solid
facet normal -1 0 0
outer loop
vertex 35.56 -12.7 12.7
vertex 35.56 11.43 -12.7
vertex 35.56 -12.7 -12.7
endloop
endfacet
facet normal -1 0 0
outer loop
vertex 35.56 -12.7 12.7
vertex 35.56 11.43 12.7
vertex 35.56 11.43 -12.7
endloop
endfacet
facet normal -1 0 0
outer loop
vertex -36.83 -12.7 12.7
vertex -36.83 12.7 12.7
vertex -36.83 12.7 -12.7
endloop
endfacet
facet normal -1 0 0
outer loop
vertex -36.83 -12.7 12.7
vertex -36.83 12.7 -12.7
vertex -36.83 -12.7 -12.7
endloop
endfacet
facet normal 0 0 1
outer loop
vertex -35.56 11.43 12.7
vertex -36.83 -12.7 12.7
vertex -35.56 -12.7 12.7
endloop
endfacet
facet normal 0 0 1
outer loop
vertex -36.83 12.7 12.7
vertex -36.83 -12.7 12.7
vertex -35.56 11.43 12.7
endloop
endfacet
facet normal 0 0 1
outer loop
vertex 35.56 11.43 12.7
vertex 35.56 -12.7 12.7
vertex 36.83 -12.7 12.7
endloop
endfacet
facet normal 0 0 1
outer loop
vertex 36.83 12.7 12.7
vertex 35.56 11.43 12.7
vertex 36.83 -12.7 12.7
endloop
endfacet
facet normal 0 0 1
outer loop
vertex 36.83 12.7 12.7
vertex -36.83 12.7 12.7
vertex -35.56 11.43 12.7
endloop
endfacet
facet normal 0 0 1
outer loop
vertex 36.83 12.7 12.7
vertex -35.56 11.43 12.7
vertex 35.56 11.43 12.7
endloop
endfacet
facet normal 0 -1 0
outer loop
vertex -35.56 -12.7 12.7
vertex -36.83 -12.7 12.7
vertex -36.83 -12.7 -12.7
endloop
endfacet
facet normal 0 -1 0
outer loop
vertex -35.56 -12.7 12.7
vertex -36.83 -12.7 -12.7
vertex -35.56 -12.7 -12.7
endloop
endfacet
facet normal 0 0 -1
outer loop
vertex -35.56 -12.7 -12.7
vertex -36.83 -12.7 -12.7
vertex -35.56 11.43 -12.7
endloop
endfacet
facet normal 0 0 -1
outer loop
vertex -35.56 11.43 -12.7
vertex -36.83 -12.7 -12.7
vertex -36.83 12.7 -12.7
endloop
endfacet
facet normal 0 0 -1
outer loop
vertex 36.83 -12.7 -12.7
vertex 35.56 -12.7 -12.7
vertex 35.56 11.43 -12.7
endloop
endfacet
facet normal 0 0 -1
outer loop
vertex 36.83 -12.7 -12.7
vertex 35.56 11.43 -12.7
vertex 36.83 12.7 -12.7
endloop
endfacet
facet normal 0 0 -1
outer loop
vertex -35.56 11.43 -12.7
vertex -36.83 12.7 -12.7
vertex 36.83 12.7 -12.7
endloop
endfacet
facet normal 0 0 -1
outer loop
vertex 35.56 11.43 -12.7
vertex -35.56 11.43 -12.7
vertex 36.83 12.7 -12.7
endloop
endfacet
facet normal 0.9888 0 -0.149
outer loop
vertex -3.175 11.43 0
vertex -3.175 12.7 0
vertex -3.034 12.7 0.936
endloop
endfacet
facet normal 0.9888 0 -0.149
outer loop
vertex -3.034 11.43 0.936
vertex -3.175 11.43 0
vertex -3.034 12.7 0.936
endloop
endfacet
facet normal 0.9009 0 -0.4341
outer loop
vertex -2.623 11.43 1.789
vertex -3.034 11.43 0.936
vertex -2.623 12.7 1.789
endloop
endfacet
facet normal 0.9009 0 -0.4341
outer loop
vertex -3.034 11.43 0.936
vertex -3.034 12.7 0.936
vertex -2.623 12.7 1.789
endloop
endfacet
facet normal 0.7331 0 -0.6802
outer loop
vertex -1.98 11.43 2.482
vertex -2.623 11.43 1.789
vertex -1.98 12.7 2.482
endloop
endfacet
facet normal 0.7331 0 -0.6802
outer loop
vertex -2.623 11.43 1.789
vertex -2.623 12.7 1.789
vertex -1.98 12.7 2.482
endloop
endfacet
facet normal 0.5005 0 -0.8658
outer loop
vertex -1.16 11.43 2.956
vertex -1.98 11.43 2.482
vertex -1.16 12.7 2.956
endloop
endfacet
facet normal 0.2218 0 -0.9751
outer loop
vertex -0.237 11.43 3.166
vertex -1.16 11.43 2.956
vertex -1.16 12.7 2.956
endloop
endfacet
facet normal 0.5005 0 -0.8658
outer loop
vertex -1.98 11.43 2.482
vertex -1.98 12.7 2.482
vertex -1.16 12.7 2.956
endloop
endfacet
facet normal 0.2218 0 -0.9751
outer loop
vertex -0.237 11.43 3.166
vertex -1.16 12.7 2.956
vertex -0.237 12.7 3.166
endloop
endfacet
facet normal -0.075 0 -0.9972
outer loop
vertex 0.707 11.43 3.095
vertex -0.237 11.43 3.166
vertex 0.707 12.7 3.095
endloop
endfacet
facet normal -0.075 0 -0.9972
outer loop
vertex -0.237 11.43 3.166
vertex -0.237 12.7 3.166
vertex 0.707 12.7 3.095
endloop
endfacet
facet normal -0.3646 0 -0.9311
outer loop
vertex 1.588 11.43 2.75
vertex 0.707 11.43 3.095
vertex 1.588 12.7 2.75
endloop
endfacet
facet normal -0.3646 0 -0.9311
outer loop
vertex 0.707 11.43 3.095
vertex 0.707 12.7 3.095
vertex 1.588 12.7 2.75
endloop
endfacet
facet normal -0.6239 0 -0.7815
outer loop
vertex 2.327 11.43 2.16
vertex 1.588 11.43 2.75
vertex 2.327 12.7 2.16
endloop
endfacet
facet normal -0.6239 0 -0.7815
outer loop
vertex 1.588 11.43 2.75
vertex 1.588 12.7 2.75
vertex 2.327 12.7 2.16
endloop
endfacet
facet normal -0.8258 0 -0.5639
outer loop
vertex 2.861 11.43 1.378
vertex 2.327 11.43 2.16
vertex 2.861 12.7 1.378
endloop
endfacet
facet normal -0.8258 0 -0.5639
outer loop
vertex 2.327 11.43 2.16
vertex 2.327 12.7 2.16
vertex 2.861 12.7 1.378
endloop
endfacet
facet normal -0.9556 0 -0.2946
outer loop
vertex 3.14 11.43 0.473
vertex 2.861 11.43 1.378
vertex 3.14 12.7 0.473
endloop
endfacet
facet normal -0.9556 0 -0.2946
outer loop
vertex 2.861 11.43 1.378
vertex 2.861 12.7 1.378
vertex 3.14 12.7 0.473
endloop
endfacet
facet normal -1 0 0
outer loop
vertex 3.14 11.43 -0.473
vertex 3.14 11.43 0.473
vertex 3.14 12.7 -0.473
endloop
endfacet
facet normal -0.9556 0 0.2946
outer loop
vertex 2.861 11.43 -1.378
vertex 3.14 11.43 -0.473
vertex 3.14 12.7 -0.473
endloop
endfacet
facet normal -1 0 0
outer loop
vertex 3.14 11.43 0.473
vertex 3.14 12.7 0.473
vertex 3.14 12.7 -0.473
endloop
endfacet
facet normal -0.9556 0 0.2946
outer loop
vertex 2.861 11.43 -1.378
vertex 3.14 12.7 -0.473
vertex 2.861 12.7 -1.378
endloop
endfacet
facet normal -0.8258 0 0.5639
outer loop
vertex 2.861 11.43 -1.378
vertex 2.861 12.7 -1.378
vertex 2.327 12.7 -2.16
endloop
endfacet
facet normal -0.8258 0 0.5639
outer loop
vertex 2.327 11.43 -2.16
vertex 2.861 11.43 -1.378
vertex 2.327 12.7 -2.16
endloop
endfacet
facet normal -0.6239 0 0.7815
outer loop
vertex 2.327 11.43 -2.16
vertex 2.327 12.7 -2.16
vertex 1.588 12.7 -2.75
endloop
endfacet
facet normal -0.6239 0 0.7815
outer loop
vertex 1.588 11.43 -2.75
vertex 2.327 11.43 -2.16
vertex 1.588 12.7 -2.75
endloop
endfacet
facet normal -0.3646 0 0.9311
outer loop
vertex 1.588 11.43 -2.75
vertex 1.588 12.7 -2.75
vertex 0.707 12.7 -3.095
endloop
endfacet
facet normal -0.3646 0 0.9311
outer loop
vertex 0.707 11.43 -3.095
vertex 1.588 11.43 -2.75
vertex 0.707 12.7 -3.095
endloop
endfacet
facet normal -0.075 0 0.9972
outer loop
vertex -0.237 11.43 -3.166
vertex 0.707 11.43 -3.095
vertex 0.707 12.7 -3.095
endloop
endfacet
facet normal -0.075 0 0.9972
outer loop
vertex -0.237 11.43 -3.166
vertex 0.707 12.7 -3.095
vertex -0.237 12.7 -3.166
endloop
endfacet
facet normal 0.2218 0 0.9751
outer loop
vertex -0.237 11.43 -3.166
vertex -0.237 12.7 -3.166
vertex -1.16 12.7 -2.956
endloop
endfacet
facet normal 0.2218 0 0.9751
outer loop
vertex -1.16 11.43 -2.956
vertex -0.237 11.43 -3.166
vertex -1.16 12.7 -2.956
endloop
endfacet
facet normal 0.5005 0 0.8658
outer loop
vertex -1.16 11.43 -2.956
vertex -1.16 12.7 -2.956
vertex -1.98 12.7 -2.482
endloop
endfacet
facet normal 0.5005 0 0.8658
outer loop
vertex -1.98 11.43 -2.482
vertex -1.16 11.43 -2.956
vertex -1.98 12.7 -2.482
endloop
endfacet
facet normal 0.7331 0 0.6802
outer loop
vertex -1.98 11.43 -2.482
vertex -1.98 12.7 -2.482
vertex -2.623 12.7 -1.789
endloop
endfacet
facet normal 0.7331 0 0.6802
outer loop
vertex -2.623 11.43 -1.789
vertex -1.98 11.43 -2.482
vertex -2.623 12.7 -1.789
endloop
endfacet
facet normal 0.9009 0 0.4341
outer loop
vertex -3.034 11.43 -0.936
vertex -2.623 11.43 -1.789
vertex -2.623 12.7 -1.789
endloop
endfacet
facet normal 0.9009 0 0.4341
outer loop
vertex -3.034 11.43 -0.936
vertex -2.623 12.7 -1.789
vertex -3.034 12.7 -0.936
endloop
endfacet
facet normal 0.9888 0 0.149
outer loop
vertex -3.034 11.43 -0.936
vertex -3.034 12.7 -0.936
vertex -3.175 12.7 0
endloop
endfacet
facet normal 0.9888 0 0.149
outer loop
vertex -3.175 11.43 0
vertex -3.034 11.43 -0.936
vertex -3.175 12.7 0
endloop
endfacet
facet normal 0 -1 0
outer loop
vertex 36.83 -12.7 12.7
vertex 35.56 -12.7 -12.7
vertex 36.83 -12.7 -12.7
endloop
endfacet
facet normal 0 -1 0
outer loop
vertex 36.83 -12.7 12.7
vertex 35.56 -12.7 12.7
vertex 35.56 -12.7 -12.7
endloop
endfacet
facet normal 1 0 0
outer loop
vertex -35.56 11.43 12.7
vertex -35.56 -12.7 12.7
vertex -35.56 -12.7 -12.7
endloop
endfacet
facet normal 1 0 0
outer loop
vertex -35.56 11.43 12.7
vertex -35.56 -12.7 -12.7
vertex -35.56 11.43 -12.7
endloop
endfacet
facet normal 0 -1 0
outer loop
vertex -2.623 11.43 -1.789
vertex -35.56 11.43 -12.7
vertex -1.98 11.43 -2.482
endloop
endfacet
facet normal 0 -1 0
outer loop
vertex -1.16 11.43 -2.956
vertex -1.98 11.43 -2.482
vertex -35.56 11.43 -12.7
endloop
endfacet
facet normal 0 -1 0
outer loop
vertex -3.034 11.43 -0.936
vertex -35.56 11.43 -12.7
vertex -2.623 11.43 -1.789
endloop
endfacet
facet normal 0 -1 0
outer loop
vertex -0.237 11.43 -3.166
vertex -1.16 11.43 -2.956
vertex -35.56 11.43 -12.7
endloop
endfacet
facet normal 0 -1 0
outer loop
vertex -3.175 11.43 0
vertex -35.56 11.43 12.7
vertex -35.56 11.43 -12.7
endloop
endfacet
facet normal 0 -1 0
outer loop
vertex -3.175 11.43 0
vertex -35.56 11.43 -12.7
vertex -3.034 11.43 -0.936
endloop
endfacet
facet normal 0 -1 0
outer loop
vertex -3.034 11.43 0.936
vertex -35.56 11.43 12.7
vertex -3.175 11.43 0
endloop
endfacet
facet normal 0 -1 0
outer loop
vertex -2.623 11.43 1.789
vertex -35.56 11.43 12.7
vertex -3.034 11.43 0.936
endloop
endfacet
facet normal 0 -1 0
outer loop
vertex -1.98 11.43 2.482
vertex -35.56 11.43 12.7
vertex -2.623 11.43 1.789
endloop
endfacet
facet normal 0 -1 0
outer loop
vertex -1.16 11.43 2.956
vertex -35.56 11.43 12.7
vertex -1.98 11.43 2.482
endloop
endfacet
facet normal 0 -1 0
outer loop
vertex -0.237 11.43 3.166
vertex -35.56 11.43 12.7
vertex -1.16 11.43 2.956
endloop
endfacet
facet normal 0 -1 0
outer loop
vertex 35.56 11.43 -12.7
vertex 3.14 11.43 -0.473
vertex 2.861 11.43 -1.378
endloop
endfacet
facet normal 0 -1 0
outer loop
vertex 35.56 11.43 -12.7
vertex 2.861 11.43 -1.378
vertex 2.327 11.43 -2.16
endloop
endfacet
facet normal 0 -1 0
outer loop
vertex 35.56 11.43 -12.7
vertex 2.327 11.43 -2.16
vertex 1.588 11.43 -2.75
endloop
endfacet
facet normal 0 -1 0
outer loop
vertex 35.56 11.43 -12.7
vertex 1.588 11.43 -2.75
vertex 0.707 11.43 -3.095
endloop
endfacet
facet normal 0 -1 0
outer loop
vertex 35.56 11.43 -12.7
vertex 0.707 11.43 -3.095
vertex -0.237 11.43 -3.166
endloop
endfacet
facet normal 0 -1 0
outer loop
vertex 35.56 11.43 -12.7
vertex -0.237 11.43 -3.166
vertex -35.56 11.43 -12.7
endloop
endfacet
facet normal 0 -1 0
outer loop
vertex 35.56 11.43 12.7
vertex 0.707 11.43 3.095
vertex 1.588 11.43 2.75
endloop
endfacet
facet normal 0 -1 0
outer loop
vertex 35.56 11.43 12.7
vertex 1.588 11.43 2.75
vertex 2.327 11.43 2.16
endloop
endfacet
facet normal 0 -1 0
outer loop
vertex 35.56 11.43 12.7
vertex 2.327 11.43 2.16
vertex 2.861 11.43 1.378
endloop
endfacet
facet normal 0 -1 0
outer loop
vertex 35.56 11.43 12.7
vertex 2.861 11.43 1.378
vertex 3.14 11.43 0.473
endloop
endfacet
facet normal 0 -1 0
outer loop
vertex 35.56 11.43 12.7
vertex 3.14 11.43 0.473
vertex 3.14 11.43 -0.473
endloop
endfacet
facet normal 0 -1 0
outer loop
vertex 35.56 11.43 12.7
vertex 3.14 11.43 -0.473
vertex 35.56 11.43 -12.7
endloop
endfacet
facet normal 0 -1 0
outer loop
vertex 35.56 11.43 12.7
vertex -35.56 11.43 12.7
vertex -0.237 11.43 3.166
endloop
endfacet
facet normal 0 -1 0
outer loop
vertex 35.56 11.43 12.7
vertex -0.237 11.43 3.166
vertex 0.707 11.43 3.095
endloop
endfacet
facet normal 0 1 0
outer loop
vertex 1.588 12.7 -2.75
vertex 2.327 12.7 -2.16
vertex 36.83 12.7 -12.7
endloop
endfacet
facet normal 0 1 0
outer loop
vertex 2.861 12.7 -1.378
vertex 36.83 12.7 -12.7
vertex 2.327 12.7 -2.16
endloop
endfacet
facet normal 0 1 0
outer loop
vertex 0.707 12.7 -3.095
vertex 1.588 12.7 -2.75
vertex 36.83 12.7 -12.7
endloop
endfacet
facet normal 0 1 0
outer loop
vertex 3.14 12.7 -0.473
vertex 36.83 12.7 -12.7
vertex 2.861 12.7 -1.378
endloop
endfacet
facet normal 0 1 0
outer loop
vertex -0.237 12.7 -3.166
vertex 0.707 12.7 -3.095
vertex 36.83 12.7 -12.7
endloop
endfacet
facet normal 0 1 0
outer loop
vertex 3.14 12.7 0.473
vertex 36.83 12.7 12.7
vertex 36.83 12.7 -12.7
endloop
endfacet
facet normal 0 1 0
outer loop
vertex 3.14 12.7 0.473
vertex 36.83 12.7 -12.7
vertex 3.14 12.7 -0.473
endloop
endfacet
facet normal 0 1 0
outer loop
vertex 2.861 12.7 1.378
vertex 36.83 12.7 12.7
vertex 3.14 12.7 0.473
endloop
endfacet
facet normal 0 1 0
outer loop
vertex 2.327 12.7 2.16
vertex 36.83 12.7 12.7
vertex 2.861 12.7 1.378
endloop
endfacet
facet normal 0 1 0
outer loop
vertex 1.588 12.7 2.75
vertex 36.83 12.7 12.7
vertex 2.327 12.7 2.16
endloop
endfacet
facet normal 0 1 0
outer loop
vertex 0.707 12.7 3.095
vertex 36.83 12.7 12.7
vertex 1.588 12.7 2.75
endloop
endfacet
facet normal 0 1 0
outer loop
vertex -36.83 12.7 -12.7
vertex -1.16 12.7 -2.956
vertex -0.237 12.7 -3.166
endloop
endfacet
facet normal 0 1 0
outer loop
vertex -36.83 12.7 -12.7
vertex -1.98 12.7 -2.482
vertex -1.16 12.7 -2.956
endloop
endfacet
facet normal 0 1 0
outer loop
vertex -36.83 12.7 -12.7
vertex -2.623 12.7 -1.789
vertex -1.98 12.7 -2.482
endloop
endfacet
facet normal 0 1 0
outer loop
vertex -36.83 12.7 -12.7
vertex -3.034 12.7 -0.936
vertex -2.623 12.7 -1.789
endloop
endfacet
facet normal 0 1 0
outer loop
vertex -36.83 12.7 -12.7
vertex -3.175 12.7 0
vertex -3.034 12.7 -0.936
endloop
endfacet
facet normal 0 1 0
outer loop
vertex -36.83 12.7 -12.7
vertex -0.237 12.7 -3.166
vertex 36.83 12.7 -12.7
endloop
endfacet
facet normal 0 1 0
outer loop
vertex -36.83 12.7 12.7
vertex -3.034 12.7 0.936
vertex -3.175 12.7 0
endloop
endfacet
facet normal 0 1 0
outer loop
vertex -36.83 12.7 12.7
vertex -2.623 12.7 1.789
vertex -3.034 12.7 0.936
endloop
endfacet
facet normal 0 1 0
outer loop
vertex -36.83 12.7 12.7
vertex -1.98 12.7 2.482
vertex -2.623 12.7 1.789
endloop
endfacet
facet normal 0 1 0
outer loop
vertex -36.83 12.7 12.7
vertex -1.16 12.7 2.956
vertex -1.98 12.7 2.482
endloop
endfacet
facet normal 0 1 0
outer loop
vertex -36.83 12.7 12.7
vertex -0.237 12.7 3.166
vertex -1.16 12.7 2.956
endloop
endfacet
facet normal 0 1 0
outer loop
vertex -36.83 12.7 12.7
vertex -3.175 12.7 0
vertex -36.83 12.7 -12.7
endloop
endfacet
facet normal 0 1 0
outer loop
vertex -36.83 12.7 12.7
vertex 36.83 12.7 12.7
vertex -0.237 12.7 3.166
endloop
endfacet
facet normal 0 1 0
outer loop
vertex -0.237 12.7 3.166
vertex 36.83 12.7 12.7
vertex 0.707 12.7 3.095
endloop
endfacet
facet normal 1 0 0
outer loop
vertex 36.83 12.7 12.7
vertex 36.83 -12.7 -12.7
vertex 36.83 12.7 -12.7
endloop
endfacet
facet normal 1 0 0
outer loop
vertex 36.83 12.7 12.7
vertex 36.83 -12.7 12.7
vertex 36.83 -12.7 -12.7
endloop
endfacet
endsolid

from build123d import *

# Parameters (mm, degrees)
F1_DEPTH = 12.7
F3_D     = 6.35
F3_DEPTH = 12.7
F3_TIP   = 1.9077324654


# Not quite as in the source:
# - a feature names something its author has since deleted; it is built from what else it names


with BuildPart() as f1:
    # F0 (on Top) → F1 (new body, symmetric)
    with BuildSketch(Plane.XY):
        Polygon((36.83, -12.7), (36.83, 12.7), (-36.83, 12.7), (-36.83, -12.7), (-35.56, -12.7), (-35.56, 11.43), (35.56, 11.43), (35.56, -12.7), align=None)
    extrude(amount=F1_DEPTH, both=True)

    # F3
    with Locations(Plane.XZ.offset(-11.43)):
        with Locations((0, 0)):
            Hole(F3_D / 2, depth=F3_DEPTH)
            with Locations((0, 0, -(F3_DEPTH + F3_TIP / 2))):  # 118° drill point
                Cone(0, F3_D / 2, F3_TIP, mode=Mode.SUBTRACT)


solid = f1.part
